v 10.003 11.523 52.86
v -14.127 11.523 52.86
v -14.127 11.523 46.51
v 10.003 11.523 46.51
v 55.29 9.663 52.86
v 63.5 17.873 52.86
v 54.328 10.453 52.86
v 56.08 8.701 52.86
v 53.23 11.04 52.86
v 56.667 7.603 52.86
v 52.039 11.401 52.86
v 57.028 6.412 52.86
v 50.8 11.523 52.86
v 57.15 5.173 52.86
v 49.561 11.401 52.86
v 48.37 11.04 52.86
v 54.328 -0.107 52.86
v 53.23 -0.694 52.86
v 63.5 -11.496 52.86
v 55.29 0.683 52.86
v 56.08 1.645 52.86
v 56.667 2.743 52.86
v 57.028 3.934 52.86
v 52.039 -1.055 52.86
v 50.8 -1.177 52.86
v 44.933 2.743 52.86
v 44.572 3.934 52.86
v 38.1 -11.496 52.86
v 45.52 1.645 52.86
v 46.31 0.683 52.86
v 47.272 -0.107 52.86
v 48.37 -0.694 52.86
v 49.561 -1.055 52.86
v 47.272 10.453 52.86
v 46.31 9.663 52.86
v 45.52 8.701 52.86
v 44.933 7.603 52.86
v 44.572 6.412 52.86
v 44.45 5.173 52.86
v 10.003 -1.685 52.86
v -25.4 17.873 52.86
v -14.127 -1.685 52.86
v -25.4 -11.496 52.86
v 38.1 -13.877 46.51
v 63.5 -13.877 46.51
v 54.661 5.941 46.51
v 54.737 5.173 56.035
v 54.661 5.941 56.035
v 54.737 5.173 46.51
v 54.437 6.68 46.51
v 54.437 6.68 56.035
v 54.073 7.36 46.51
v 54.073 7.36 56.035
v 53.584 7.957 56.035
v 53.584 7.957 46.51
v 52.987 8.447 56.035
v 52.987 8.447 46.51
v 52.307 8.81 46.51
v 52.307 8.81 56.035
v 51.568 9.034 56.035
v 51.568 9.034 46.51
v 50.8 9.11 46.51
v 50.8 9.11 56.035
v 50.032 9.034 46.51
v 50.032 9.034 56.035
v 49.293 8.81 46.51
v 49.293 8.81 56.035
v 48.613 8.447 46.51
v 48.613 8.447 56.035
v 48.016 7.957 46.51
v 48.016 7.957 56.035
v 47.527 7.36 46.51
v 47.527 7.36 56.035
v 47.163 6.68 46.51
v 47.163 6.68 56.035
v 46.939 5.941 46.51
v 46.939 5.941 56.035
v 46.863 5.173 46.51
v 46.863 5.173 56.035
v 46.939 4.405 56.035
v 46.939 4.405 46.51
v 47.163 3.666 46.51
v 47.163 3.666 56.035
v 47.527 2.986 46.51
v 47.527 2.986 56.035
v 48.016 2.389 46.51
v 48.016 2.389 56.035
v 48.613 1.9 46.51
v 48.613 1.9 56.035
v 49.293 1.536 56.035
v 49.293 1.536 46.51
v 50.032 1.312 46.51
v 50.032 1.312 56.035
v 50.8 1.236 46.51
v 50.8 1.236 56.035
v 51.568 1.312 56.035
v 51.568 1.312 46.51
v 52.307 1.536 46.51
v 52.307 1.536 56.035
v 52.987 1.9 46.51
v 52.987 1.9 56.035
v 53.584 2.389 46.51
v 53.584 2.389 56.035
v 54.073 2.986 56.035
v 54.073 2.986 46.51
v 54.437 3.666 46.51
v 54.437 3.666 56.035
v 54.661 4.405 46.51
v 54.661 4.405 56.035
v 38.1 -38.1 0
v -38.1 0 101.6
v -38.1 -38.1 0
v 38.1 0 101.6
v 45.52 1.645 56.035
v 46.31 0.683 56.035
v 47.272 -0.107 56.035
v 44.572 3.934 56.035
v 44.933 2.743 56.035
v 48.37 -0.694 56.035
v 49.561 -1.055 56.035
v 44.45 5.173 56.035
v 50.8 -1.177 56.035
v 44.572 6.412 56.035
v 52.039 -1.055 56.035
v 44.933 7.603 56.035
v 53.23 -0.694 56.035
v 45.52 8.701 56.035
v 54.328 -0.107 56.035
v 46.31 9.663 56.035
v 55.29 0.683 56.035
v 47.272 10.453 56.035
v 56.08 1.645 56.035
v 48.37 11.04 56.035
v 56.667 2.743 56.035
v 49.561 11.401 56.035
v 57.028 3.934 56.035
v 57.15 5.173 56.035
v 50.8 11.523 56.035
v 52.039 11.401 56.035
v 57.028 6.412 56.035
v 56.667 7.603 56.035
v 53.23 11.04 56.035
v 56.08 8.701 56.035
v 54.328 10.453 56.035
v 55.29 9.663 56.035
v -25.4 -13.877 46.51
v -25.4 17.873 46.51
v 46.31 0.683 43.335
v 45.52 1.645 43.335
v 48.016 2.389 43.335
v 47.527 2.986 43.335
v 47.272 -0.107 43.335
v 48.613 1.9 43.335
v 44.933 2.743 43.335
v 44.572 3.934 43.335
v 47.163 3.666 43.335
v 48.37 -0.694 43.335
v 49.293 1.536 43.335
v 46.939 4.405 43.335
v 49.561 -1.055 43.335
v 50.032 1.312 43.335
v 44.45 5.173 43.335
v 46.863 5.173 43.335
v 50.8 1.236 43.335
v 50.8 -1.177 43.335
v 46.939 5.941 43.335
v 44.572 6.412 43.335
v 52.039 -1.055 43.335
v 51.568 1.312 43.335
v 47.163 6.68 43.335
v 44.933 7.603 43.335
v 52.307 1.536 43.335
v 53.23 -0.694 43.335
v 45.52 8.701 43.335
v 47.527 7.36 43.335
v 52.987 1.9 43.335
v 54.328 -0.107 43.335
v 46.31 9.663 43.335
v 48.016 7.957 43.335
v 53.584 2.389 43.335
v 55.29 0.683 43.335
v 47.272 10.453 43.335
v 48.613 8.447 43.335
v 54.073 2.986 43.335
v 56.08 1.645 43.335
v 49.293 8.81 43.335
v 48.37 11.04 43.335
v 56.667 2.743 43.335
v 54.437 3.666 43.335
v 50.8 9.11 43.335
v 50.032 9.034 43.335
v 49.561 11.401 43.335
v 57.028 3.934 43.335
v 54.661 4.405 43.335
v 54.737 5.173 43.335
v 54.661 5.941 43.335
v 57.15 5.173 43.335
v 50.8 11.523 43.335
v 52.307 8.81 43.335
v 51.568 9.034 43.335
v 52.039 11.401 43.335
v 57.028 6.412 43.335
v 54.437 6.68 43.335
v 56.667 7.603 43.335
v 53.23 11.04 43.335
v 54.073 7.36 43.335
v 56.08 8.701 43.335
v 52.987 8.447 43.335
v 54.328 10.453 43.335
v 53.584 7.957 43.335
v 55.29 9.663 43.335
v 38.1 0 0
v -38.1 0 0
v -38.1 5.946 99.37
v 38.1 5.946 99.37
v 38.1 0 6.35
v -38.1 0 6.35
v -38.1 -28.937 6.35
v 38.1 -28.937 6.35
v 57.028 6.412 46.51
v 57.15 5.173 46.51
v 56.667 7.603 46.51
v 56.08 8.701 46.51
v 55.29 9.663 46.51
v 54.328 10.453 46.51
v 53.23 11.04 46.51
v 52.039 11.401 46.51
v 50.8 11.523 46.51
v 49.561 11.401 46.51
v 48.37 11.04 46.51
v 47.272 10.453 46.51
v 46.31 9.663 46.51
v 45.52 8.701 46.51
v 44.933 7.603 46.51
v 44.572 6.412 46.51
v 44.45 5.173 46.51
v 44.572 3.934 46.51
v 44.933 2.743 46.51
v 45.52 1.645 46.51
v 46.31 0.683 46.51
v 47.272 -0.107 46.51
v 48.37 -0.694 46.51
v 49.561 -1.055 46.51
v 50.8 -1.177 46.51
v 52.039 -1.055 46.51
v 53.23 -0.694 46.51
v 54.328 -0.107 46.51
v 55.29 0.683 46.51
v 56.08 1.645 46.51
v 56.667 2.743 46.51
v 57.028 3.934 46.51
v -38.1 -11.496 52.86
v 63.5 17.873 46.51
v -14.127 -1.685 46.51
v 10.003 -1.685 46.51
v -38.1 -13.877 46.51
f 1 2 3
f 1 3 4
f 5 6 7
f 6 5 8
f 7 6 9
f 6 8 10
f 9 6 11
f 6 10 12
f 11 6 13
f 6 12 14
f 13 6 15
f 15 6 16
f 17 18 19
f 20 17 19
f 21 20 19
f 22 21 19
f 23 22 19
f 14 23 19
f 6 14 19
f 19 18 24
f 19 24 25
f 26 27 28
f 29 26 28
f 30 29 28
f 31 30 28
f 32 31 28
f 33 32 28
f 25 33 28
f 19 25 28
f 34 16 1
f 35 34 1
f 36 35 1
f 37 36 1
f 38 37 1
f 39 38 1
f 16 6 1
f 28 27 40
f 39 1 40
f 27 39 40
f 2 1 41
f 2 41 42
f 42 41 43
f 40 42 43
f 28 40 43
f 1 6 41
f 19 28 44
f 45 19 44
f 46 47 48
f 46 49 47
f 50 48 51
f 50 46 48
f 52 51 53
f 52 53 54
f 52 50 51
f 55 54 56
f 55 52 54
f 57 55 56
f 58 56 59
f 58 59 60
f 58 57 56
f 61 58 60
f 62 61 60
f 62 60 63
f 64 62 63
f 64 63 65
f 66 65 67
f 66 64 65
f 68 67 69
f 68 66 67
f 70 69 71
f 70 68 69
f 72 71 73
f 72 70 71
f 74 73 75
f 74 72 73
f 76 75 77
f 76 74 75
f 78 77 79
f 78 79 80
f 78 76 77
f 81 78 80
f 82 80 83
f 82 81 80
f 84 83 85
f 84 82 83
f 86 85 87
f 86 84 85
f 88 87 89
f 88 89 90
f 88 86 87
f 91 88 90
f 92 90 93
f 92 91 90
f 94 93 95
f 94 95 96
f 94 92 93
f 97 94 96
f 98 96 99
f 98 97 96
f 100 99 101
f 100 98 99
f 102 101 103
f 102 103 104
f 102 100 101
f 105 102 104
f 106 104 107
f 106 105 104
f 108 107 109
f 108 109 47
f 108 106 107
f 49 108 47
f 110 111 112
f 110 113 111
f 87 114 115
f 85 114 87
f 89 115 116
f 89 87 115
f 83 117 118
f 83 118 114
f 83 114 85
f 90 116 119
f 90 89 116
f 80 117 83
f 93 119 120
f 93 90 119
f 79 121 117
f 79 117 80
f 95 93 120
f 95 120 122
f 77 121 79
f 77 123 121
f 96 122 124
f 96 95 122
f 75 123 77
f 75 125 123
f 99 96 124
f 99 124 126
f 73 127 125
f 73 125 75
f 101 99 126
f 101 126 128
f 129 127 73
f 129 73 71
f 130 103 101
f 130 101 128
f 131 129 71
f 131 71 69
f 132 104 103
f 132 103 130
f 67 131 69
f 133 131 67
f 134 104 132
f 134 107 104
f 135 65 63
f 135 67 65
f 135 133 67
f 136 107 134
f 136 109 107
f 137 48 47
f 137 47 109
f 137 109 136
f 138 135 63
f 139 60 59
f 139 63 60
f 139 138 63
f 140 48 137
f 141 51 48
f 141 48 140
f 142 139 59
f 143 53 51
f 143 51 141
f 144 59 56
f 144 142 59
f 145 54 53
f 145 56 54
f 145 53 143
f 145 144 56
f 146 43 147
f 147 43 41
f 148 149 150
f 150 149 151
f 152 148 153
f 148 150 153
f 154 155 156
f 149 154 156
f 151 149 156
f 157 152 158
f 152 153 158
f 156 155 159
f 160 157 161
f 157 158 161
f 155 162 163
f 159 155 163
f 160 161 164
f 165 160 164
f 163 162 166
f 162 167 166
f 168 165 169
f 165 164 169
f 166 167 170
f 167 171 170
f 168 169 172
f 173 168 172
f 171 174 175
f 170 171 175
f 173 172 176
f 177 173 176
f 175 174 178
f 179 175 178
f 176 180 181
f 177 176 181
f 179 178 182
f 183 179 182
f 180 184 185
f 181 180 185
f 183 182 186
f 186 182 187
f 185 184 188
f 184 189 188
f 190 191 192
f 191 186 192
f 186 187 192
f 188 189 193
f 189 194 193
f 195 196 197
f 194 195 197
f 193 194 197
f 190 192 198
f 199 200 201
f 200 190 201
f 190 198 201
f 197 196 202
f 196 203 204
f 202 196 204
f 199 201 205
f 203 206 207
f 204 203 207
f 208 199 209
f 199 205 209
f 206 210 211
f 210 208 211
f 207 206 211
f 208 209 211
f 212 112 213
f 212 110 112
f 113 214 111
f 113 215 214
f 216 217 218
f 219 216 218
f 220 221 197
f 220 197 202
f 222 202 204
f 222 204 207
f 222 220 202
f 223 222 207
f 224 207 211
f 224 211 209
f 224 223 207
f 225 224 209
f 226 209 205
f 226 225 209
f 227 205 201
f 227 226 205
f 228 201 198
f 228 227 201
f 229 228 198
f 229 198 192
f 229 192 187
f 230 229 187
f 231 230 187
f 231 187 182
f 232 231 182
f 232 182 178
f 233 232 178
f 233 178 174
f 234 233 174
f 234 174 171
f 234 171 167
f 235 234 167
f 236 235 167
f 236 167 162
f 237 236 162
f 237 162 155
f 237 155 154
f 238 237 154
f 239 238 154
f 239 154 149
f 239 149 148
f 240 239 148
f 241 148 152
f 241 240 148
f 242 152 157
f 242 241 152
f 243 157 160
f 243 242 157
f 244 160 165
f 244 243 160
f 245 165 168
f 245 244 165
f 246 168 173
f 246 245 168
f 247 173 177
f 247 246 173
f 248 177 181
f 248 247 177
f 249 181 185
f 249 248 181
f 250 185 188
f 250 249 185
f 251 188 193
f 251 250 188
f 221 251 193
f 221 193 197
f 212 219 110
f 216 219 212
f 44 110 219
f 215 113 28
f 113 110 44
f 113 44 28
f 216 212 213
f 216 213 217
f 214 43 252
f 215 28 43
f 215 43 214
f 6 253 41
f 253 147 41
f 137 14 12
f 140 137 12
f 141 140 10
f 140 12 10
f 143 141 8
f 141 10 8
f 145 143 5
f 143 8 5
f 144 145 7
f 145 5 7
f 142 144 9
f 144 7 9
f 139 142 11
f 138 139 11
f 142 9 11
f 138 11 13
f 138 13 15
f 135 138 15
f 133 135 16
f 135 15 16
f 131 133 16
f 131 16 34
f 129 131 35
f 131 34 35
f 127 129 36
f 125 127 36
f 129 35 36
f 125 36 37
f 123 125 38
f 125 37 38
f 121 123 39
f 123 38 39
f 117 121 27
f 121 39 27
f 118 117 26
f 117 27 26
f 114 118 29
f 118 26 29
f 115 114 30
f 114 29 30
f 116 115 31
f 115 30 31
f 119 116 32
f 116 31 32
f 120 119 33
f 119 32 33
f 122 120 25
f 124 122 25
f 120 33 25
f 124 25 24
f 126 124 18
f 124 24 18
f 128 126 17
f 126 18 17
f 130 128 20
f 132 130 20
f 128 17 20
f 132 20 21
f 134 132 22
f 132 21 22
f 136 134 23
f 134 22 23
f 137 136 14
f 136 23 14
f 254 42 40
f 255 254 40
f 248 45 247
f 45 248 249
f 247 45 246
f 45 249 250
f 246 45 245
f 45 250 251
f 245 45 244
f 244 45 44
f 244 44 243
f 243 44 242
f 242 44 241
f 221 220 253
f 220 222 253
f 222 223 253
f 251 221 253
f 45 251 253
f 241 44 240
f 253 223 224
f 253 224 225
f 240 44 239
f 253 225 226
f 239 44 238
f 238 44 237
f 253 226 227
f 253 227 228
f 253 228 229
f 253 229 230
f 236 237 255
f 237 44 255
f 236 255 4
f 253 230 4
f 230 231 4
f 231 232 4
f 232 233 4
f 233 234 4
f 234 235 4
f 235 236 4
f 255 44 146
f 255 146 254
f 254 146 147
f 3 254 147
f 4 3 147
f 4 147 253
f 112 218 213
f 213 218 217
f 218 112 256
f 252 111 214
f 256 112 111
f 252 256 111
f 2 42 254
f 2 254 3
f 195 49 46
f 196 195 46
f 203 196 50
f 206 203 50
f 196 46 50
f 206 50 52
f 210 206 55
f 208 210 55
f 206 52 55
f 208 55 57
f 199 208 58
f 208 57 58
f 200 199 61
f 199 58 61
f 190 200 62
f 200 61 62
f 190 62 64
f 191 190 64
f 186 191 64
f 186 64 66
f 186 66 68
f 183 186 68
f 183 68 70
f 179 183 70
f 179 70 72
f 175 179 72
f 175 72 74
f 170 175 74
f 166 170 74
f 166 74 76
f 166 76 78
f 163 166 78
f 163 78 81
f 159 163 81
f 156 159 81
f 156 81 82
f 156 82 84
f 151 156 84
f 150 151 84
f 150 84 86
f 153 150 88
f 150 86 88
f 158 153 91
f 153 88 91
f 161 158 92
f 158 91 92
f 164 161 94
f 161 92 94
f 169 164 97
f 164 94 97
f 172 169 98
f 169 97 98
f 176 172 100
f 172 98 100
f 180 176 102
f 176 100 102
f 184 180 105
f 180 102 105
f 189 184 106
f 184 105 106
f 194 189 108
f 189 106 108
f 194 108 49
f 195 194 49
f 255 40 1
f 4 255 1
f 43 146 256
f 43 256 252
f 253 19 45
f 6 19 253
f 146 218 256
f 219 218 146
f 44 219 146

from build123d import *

# Parameters (mm, degrees)
F1_DEPTH    = 38.1
F2_DEPTH    = 25.4
F3_DEPTH    = 38.1
F4_R        = 3.937
F5_DEPTH    = 6.35
F4_R_2      = 6.35
F6_DEPTH    = 3.175
F6_FACE_R   = 6.35
F6_FACE_R_2 = 3.937
F7_DEPTH    = 12.7
F8_W        = 24.13
F8_H        = 13.208
F9_DEPTH    = 6.35


with BuildPart() as f1:
    # F0 (on Right) → F1 (new body, symmetric)
    with BuildSketch(Plane.YZ):
        Polygon((-38.1, 0), (0, 0), (0, 6.35), (-28.936947, 6.35), (-13.876878, 46.510183), (-11.495628, 52.860183), (5.94569, 99.370366), (0, 101.6), align=None)
    extrude(amount=F1_DEPTH, both=True)

    # F0 (on Right) → F2 (join, symmetric)
    with BuildSketch(Plane.YZ):
        Polygon((-11.495628, 52.860183), (-13.876878, 46.510183), (17.873122, 46.510183), (17.873122, 52.860183), align=None)
    extrude(amount=F2_DEPTH, both=True)

    # F2_face (on face) → F3 (join)
    with BuildSketch(Plane(origin=(25.4, 2.585703, 49.643949), x_dir=(0, 1, 0), z_dir=(1, 0, 0))):
        Polygon((-14.081331, 3.216234), (-16.462581, -3.133766), (15.287419, -3.133766), (15.287419, 3.216234), align=None)
    extrude(amount=F3_DEPTH)

    # F4 (on face) → F5 (cut, through all)
    with BuildSketch(Plane.XY.offset(52.860183)):
        with Locations((50.8, 5.173122)):
            Circle(F4_R)
    extrude(amount=-F5_DEPTH, mode=Mode.SUBTRACT)

    # F4 (on face) → F6 (join)
    with BuildSketch(Plane.XY.offset(52.860183)):
        with Locations((50.8, 5.173122)):
            Circle(F4_R_2)
        with Locations((50.8, 5.173122)):
            Circle(F4_R, mode=Mode.SUBTRACT)
    extrude(amount=F6_DEPTH)

    # F6_face (on face) → F7 (join)
    with BuildSketch(Plane(origin=(50.8, 5.173122, 56.035183), x_dir=(1, 0, 0), z_dir=(0, 0, 1))):
        Circle(F6_FACE_R)
        Circle(F6_FACE_R_2, mode=Mode.SUBTRACT)
    extrude(amount=-F7_DEPTH)

    # F8 (on face) → F9 (cut, through all)
    with BuildSketch(Plane.XY.offset(52.860183)):
        with Locations((-2.062116, 4.919122)):
            Rectangle(F8_W, F8_H)
    extrude(amount=-F9_DEPTH, mode=Mode.SUBTRACT)


solid = f1.part
